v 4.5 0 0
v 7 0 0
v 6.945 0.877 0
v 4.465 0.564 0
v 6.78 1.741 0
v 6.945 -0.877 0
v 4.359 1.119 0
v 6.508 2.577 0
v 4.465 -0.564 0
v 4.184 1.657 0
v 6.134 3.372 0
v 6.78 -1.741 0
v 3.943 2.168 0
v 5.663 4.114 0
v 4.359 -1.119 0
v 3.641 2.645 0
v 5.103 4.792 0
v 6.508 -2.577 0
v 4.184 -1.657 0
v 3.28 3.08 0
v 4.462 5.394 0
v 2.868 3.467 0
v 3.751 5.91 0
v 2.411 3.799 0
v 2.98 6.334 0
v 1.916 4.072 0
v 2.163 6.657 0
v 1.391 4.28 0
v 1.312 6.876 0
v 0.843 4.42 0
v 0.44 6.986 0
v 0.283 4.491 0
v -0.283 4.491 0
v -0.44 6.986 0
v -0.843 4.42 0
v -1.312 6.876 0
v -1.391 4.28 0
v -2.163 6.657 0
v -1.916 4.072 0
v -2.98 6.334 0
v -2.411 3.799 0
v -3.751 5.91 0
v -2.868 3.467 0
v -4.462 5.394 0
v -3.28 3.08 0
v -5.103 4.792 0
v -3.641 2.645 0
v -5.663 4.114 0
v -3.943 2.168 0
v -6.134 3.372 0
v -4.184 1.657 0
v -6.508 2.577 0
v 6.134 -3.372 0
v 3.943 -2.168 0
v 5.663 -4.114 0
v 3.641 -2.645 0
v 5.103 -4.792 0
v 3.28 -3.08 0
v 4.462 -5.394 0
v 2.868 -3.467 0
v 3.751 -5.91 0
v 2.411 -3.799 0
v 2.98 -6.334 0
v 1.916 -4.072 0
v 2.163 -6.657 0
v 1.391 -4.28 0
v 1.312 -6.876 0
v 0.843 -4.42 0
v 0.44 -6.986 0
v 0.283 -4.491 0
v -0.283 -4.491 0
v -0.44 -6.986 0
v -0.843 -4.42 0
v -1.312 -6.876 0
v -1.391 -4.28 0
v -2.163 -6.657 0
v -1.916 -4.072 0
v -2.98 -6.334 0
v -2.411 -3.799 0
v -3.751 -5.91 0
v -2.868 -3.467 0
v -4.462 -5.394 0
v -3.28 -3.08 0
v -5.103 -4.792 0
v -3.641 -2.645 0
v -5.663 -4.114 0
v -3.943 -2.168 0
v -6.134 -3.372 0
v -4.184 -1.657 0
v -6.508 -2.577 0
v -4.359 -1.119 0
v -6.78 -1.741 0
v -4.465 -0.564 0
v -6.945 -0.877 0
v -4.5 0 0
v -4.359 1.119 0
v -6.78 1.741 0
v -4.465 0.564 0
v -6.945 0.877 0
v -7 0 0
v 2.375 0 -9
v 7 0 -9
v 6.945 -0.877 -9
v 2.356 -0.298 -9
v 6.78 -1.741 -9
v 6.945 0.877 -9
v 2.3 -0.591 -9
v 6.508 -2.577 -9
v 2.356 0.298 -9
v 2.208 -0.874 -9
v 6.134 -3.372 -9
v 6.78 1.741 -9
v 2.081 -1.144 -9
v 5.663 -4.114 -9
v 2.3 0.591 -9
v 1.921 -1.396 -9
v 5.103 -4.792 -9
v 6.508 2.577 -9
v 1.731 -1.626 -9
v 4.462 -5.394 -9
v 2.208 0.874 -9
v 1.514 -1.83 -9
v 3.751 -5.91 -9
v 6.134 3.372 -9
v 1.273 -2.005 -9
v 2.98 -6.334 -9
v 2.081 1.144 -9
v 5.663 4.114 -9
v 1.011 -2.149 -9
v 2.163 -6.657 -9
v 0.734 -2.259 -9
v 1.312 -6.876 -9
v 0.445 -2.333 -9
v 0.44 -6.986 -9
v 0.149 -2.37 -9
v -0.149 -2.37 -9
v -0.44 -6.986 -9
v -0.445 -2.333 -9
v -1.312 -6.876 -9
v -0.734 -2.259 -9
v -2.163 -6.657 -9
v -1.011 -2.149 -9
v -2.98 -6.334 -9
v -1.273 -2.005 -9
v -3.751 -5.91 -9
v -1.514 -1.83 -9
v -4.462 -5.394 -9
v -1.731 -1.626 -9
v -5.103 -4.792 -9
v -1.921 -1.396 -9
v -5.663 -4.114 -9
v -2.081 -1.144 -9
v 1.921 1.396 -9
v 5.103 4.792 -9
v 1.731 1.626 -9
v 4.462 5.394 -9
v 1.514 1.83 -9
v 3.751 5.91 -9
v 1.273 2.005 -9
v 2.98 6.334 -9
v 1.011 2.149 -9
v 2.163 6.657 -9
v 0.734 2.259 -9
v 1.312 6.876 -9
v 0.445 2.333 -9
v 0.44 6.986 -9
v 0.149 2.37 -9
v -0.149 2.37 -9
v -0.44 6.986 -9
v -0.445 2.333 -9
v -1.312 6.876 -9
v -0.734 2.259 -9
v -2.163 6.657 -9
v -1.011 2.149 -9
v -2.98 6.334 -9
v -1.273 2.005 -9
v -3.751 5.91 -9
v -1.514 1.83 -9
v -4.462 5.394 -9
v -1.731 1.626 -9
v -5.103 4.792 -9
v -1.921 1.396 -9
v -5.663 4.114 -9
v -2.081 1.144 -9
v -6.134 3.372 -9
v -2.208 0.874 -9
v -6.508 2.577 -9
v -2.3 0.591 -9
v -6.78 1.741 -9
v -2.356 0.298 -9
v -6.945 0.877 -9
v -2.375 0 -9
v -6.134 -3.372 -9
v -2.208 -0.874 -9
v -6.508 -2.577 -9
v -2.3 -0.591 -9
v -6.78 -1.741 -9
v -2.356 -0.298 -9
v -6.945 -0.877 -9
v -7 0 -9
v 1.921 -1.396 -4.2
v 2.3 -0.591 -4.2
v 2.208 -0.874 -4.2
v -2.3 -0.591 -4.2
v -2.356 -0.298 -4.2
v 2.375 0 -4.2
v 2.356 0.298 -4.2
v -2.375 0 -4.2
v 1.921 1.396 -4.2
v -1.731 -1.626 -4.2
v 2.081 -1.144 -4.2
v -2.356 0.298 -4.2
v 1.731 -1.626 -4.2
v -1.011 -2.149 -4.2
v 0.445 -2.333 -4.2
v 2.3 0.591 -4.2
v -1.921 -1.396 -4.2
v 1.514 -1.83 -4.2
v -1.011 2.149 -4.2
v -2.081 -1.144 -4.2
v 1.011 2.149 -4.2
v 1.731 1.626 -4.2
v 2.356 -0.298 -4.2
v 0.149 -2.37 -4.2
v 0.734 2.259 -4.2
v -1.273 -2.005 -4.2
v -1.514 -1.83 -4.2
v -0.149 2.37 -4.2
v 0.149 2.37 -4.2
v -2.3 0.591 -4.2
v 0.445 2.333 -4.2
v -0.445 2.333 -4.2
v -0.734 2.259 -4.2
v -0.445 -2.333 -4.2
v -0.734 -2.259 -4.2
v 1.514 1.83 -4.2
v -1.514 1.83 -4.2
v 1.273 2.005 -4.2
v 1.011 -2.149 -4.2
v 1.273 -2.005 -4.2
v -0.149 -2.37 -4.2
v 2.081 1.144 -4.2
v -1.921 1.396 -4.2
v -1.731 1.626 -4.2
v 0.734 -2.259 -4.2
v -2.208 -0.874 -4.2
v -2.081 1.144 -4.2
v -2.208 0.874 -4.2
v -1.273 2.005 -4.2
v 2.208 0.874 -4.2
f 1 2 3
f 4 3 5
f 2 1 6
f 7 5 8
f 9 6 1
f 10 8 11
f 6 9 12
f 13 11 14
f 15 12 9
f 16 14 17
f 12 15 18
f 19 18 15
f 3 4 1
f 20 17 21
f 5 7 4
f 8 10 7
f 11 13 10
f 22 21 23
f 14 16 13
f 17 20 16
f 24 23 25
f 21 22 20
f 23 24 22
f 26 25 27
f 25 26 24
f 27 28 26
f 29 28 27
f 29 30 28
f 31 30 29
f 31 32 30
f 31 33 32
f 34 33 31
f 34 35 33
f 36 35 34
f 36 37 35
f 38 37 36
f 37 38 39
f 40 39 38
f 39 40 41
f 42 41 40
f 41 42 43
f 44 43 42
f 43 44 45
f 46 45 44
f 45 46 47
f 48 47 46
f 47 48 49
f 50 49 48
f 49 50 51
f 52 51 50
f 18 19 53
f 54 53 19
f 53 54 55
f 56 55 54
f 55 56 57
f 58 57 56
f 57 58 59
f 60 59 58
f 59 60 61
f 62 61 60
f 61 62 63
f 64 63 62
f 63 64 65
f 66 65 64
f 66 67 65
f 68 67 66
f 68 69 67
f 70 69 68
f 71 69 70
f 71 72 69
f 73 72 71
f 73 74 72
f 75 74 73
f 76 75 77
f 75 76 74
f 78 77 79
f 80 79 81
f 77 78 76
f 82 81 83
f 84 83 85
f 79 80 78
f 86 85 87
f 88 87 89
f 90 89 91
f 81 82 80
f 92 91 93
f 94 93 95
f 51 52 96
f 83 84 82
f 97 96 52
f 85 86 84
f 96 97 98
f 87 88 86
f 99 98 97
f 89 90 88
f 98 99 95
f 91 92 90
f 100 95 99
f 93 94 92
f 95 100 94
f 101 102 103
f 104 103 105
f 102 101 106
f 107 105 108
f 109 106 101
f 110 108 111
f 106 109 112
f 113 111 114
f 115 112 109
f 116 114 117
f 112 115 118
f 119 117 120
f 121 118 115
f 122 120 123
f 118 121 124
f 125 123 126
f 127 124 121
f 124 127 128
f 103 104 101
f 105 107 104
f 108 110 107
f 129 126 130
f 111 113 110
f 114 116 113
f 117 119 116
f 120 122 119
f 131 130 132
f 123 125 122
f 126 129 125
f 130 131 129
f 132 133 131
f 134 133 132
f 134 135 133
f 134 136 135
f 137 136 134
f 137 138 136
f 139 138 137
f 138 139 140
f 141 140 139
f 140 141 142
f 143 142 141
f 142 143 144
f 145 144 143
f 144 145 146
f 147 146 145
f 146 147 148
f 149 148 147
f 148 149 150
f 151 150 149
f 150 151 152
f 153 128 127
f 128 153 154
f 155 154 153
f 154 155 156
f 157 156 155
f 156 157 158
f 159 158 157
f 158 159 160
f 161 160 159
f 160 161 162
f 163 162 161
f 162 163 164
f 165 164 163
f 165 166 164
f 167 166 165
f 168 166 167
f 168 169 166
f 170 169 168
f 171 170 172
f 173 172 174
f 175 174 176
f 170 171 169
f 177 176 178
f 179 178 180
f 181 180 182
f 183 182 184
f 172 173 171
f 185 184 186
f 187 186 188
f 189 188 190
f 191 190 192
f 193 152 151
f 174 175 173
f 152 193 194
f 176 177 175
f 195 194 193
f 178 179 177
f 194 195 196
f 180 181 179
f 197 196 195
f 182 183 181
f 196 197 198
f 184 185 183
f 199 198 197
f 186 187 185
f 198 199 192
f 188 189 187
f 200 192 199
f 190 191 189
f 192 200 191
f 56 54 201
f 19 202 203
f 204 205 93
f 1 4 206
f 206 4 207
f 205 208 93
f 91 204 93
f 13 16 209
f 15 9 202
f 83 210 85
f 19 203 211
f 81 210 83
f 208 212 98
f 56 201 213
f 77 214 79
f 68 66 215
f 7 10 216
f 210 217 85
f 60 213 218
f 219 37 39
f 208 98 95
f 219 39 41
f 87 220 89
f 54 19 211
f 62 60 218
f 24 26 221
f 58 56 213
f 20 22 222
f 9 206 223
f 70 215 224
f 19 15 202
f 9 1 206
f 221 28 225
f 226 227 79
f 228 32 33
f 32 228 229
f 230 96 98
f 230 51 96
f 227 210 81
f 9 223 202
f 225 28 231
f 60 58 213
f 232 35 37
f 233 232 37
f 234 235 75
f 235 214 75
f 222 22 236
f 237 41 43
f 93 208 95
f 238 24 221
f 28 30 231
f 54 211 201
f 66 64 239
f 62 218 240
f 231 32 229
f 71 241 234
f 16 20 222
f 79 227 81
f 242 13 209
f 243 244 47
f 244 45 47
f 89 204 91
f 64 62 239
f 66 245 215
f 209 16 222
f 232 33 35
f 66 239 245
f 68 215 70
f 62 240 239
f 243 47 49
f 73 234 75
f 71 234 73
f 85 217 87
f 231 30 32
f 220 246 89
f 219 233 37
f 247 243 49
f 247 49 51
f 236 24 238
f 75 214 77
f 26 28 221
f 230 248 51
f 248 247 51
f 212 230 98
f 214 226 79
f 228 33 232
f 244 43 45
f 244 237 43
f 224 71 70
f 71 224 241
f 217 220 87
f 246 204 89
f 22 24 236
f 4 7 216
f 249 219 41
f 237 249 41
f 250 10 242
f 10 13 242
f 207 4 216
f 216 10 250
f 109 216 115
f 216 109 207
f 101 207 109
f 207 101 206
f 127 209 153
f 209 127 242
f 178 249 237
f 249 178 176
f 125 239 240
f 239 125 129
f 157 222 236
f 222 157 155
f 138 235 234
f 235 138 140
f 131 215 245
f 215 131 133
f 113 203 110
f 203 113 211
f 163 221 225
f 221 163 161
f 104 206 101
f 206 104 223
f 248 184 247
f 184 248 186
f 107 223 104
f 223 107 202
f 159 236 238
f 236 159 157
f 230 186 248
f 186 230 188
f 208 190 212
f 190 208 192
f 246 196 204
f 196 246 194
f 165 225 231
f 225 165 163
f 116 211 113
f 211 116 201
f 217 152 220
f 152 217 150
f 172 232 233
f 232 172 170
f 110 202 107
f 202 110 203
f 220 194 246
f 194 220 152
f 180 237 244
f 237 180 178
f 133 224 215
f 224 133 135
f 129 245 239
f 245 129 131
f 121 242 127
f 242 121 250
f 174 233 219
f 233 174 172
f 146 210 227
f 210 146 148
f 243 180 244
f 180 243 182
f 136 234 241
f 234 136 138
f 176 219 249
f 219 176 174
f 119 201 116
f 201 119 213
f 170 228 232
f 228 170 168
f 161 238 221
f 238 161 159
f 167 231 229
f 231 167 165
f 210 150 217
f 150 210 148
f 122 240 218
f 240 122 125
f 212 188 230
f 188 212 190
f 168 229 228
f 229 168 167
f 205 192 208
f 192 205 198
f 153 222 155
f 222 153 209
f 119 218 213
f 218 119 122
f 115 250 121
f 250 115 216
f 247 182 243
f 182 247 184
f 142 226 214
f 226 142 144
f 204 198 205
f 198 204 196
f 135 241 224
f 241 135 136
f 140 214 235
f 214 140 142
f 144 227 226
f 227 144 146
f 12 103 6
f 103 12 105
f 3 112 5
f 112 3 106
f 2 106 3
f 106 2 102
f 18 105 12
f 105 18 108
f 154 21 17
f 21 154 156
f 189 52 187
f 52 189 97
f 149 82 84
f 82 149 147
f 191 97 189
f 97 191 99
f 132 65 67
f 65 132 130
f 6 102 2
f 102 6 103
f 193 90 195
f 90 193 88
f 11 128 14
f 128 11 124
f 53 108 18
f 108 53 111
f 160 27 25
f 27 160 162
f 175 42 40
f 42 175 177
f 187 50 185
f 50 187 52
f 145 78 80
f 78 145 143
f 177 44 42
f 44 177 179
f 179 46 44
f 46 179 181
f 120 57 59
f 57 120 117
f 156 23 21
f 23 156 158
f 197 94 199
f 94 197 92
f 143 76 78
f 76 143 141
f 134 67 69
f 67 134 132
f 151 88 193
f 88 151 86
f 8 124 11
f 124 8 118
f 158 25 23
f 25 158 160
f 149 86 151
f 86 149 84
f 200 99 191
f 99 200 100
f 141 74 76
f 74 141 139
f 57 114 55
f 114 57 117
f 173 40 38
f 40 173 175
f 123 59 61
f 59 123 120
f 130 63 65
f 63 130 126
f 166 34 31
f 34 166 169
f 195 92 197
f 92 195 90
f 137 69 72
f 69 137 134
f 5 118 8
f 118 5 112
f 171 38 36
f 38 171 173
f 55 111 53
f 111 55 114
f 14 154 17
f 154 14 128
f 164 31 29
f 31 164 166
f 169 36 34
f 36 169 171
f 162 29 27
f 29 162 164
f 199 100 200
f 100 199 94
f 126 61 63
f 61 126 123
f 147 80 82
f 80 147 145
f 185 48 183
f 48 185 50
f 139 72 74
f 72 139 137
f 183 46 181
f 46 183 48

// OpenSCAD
$fn = 50;


difference() {
	union() {
		translate(v = [0, 0, -9.0000000000]) {
			cylinder(h = 9, r = 7.0000000000);
		}
		cylinder(h = 0, r = 17.0000000000);
	}
	union() {
		translate(v = [0, 0, 0]) {
			rotate(a = [0, 0, 0]) {
				difference() {
					union() {
						#translate(v = [0, 0, -9.0000000000]) {
							cylinder(h = 9, r = 2.2500000000);
						}
						#translate(v = [0, 0, -4.2000000000]) {
							cylinder(h = 4.2000000000, r1 = 2.3750000000, r2 = 4.5000000000);
						}
						#translate(v = [0, 0, -9.0000000000]) {
							cylinder(h = 9, r = 2.3750000000);
						}
						#translate(v = [0, 0, -9.0000000000]) {
							cylinder(h = 9, r = 2.2500000000);
						}
					}
					union();
				}
			}
		}
	}
}
